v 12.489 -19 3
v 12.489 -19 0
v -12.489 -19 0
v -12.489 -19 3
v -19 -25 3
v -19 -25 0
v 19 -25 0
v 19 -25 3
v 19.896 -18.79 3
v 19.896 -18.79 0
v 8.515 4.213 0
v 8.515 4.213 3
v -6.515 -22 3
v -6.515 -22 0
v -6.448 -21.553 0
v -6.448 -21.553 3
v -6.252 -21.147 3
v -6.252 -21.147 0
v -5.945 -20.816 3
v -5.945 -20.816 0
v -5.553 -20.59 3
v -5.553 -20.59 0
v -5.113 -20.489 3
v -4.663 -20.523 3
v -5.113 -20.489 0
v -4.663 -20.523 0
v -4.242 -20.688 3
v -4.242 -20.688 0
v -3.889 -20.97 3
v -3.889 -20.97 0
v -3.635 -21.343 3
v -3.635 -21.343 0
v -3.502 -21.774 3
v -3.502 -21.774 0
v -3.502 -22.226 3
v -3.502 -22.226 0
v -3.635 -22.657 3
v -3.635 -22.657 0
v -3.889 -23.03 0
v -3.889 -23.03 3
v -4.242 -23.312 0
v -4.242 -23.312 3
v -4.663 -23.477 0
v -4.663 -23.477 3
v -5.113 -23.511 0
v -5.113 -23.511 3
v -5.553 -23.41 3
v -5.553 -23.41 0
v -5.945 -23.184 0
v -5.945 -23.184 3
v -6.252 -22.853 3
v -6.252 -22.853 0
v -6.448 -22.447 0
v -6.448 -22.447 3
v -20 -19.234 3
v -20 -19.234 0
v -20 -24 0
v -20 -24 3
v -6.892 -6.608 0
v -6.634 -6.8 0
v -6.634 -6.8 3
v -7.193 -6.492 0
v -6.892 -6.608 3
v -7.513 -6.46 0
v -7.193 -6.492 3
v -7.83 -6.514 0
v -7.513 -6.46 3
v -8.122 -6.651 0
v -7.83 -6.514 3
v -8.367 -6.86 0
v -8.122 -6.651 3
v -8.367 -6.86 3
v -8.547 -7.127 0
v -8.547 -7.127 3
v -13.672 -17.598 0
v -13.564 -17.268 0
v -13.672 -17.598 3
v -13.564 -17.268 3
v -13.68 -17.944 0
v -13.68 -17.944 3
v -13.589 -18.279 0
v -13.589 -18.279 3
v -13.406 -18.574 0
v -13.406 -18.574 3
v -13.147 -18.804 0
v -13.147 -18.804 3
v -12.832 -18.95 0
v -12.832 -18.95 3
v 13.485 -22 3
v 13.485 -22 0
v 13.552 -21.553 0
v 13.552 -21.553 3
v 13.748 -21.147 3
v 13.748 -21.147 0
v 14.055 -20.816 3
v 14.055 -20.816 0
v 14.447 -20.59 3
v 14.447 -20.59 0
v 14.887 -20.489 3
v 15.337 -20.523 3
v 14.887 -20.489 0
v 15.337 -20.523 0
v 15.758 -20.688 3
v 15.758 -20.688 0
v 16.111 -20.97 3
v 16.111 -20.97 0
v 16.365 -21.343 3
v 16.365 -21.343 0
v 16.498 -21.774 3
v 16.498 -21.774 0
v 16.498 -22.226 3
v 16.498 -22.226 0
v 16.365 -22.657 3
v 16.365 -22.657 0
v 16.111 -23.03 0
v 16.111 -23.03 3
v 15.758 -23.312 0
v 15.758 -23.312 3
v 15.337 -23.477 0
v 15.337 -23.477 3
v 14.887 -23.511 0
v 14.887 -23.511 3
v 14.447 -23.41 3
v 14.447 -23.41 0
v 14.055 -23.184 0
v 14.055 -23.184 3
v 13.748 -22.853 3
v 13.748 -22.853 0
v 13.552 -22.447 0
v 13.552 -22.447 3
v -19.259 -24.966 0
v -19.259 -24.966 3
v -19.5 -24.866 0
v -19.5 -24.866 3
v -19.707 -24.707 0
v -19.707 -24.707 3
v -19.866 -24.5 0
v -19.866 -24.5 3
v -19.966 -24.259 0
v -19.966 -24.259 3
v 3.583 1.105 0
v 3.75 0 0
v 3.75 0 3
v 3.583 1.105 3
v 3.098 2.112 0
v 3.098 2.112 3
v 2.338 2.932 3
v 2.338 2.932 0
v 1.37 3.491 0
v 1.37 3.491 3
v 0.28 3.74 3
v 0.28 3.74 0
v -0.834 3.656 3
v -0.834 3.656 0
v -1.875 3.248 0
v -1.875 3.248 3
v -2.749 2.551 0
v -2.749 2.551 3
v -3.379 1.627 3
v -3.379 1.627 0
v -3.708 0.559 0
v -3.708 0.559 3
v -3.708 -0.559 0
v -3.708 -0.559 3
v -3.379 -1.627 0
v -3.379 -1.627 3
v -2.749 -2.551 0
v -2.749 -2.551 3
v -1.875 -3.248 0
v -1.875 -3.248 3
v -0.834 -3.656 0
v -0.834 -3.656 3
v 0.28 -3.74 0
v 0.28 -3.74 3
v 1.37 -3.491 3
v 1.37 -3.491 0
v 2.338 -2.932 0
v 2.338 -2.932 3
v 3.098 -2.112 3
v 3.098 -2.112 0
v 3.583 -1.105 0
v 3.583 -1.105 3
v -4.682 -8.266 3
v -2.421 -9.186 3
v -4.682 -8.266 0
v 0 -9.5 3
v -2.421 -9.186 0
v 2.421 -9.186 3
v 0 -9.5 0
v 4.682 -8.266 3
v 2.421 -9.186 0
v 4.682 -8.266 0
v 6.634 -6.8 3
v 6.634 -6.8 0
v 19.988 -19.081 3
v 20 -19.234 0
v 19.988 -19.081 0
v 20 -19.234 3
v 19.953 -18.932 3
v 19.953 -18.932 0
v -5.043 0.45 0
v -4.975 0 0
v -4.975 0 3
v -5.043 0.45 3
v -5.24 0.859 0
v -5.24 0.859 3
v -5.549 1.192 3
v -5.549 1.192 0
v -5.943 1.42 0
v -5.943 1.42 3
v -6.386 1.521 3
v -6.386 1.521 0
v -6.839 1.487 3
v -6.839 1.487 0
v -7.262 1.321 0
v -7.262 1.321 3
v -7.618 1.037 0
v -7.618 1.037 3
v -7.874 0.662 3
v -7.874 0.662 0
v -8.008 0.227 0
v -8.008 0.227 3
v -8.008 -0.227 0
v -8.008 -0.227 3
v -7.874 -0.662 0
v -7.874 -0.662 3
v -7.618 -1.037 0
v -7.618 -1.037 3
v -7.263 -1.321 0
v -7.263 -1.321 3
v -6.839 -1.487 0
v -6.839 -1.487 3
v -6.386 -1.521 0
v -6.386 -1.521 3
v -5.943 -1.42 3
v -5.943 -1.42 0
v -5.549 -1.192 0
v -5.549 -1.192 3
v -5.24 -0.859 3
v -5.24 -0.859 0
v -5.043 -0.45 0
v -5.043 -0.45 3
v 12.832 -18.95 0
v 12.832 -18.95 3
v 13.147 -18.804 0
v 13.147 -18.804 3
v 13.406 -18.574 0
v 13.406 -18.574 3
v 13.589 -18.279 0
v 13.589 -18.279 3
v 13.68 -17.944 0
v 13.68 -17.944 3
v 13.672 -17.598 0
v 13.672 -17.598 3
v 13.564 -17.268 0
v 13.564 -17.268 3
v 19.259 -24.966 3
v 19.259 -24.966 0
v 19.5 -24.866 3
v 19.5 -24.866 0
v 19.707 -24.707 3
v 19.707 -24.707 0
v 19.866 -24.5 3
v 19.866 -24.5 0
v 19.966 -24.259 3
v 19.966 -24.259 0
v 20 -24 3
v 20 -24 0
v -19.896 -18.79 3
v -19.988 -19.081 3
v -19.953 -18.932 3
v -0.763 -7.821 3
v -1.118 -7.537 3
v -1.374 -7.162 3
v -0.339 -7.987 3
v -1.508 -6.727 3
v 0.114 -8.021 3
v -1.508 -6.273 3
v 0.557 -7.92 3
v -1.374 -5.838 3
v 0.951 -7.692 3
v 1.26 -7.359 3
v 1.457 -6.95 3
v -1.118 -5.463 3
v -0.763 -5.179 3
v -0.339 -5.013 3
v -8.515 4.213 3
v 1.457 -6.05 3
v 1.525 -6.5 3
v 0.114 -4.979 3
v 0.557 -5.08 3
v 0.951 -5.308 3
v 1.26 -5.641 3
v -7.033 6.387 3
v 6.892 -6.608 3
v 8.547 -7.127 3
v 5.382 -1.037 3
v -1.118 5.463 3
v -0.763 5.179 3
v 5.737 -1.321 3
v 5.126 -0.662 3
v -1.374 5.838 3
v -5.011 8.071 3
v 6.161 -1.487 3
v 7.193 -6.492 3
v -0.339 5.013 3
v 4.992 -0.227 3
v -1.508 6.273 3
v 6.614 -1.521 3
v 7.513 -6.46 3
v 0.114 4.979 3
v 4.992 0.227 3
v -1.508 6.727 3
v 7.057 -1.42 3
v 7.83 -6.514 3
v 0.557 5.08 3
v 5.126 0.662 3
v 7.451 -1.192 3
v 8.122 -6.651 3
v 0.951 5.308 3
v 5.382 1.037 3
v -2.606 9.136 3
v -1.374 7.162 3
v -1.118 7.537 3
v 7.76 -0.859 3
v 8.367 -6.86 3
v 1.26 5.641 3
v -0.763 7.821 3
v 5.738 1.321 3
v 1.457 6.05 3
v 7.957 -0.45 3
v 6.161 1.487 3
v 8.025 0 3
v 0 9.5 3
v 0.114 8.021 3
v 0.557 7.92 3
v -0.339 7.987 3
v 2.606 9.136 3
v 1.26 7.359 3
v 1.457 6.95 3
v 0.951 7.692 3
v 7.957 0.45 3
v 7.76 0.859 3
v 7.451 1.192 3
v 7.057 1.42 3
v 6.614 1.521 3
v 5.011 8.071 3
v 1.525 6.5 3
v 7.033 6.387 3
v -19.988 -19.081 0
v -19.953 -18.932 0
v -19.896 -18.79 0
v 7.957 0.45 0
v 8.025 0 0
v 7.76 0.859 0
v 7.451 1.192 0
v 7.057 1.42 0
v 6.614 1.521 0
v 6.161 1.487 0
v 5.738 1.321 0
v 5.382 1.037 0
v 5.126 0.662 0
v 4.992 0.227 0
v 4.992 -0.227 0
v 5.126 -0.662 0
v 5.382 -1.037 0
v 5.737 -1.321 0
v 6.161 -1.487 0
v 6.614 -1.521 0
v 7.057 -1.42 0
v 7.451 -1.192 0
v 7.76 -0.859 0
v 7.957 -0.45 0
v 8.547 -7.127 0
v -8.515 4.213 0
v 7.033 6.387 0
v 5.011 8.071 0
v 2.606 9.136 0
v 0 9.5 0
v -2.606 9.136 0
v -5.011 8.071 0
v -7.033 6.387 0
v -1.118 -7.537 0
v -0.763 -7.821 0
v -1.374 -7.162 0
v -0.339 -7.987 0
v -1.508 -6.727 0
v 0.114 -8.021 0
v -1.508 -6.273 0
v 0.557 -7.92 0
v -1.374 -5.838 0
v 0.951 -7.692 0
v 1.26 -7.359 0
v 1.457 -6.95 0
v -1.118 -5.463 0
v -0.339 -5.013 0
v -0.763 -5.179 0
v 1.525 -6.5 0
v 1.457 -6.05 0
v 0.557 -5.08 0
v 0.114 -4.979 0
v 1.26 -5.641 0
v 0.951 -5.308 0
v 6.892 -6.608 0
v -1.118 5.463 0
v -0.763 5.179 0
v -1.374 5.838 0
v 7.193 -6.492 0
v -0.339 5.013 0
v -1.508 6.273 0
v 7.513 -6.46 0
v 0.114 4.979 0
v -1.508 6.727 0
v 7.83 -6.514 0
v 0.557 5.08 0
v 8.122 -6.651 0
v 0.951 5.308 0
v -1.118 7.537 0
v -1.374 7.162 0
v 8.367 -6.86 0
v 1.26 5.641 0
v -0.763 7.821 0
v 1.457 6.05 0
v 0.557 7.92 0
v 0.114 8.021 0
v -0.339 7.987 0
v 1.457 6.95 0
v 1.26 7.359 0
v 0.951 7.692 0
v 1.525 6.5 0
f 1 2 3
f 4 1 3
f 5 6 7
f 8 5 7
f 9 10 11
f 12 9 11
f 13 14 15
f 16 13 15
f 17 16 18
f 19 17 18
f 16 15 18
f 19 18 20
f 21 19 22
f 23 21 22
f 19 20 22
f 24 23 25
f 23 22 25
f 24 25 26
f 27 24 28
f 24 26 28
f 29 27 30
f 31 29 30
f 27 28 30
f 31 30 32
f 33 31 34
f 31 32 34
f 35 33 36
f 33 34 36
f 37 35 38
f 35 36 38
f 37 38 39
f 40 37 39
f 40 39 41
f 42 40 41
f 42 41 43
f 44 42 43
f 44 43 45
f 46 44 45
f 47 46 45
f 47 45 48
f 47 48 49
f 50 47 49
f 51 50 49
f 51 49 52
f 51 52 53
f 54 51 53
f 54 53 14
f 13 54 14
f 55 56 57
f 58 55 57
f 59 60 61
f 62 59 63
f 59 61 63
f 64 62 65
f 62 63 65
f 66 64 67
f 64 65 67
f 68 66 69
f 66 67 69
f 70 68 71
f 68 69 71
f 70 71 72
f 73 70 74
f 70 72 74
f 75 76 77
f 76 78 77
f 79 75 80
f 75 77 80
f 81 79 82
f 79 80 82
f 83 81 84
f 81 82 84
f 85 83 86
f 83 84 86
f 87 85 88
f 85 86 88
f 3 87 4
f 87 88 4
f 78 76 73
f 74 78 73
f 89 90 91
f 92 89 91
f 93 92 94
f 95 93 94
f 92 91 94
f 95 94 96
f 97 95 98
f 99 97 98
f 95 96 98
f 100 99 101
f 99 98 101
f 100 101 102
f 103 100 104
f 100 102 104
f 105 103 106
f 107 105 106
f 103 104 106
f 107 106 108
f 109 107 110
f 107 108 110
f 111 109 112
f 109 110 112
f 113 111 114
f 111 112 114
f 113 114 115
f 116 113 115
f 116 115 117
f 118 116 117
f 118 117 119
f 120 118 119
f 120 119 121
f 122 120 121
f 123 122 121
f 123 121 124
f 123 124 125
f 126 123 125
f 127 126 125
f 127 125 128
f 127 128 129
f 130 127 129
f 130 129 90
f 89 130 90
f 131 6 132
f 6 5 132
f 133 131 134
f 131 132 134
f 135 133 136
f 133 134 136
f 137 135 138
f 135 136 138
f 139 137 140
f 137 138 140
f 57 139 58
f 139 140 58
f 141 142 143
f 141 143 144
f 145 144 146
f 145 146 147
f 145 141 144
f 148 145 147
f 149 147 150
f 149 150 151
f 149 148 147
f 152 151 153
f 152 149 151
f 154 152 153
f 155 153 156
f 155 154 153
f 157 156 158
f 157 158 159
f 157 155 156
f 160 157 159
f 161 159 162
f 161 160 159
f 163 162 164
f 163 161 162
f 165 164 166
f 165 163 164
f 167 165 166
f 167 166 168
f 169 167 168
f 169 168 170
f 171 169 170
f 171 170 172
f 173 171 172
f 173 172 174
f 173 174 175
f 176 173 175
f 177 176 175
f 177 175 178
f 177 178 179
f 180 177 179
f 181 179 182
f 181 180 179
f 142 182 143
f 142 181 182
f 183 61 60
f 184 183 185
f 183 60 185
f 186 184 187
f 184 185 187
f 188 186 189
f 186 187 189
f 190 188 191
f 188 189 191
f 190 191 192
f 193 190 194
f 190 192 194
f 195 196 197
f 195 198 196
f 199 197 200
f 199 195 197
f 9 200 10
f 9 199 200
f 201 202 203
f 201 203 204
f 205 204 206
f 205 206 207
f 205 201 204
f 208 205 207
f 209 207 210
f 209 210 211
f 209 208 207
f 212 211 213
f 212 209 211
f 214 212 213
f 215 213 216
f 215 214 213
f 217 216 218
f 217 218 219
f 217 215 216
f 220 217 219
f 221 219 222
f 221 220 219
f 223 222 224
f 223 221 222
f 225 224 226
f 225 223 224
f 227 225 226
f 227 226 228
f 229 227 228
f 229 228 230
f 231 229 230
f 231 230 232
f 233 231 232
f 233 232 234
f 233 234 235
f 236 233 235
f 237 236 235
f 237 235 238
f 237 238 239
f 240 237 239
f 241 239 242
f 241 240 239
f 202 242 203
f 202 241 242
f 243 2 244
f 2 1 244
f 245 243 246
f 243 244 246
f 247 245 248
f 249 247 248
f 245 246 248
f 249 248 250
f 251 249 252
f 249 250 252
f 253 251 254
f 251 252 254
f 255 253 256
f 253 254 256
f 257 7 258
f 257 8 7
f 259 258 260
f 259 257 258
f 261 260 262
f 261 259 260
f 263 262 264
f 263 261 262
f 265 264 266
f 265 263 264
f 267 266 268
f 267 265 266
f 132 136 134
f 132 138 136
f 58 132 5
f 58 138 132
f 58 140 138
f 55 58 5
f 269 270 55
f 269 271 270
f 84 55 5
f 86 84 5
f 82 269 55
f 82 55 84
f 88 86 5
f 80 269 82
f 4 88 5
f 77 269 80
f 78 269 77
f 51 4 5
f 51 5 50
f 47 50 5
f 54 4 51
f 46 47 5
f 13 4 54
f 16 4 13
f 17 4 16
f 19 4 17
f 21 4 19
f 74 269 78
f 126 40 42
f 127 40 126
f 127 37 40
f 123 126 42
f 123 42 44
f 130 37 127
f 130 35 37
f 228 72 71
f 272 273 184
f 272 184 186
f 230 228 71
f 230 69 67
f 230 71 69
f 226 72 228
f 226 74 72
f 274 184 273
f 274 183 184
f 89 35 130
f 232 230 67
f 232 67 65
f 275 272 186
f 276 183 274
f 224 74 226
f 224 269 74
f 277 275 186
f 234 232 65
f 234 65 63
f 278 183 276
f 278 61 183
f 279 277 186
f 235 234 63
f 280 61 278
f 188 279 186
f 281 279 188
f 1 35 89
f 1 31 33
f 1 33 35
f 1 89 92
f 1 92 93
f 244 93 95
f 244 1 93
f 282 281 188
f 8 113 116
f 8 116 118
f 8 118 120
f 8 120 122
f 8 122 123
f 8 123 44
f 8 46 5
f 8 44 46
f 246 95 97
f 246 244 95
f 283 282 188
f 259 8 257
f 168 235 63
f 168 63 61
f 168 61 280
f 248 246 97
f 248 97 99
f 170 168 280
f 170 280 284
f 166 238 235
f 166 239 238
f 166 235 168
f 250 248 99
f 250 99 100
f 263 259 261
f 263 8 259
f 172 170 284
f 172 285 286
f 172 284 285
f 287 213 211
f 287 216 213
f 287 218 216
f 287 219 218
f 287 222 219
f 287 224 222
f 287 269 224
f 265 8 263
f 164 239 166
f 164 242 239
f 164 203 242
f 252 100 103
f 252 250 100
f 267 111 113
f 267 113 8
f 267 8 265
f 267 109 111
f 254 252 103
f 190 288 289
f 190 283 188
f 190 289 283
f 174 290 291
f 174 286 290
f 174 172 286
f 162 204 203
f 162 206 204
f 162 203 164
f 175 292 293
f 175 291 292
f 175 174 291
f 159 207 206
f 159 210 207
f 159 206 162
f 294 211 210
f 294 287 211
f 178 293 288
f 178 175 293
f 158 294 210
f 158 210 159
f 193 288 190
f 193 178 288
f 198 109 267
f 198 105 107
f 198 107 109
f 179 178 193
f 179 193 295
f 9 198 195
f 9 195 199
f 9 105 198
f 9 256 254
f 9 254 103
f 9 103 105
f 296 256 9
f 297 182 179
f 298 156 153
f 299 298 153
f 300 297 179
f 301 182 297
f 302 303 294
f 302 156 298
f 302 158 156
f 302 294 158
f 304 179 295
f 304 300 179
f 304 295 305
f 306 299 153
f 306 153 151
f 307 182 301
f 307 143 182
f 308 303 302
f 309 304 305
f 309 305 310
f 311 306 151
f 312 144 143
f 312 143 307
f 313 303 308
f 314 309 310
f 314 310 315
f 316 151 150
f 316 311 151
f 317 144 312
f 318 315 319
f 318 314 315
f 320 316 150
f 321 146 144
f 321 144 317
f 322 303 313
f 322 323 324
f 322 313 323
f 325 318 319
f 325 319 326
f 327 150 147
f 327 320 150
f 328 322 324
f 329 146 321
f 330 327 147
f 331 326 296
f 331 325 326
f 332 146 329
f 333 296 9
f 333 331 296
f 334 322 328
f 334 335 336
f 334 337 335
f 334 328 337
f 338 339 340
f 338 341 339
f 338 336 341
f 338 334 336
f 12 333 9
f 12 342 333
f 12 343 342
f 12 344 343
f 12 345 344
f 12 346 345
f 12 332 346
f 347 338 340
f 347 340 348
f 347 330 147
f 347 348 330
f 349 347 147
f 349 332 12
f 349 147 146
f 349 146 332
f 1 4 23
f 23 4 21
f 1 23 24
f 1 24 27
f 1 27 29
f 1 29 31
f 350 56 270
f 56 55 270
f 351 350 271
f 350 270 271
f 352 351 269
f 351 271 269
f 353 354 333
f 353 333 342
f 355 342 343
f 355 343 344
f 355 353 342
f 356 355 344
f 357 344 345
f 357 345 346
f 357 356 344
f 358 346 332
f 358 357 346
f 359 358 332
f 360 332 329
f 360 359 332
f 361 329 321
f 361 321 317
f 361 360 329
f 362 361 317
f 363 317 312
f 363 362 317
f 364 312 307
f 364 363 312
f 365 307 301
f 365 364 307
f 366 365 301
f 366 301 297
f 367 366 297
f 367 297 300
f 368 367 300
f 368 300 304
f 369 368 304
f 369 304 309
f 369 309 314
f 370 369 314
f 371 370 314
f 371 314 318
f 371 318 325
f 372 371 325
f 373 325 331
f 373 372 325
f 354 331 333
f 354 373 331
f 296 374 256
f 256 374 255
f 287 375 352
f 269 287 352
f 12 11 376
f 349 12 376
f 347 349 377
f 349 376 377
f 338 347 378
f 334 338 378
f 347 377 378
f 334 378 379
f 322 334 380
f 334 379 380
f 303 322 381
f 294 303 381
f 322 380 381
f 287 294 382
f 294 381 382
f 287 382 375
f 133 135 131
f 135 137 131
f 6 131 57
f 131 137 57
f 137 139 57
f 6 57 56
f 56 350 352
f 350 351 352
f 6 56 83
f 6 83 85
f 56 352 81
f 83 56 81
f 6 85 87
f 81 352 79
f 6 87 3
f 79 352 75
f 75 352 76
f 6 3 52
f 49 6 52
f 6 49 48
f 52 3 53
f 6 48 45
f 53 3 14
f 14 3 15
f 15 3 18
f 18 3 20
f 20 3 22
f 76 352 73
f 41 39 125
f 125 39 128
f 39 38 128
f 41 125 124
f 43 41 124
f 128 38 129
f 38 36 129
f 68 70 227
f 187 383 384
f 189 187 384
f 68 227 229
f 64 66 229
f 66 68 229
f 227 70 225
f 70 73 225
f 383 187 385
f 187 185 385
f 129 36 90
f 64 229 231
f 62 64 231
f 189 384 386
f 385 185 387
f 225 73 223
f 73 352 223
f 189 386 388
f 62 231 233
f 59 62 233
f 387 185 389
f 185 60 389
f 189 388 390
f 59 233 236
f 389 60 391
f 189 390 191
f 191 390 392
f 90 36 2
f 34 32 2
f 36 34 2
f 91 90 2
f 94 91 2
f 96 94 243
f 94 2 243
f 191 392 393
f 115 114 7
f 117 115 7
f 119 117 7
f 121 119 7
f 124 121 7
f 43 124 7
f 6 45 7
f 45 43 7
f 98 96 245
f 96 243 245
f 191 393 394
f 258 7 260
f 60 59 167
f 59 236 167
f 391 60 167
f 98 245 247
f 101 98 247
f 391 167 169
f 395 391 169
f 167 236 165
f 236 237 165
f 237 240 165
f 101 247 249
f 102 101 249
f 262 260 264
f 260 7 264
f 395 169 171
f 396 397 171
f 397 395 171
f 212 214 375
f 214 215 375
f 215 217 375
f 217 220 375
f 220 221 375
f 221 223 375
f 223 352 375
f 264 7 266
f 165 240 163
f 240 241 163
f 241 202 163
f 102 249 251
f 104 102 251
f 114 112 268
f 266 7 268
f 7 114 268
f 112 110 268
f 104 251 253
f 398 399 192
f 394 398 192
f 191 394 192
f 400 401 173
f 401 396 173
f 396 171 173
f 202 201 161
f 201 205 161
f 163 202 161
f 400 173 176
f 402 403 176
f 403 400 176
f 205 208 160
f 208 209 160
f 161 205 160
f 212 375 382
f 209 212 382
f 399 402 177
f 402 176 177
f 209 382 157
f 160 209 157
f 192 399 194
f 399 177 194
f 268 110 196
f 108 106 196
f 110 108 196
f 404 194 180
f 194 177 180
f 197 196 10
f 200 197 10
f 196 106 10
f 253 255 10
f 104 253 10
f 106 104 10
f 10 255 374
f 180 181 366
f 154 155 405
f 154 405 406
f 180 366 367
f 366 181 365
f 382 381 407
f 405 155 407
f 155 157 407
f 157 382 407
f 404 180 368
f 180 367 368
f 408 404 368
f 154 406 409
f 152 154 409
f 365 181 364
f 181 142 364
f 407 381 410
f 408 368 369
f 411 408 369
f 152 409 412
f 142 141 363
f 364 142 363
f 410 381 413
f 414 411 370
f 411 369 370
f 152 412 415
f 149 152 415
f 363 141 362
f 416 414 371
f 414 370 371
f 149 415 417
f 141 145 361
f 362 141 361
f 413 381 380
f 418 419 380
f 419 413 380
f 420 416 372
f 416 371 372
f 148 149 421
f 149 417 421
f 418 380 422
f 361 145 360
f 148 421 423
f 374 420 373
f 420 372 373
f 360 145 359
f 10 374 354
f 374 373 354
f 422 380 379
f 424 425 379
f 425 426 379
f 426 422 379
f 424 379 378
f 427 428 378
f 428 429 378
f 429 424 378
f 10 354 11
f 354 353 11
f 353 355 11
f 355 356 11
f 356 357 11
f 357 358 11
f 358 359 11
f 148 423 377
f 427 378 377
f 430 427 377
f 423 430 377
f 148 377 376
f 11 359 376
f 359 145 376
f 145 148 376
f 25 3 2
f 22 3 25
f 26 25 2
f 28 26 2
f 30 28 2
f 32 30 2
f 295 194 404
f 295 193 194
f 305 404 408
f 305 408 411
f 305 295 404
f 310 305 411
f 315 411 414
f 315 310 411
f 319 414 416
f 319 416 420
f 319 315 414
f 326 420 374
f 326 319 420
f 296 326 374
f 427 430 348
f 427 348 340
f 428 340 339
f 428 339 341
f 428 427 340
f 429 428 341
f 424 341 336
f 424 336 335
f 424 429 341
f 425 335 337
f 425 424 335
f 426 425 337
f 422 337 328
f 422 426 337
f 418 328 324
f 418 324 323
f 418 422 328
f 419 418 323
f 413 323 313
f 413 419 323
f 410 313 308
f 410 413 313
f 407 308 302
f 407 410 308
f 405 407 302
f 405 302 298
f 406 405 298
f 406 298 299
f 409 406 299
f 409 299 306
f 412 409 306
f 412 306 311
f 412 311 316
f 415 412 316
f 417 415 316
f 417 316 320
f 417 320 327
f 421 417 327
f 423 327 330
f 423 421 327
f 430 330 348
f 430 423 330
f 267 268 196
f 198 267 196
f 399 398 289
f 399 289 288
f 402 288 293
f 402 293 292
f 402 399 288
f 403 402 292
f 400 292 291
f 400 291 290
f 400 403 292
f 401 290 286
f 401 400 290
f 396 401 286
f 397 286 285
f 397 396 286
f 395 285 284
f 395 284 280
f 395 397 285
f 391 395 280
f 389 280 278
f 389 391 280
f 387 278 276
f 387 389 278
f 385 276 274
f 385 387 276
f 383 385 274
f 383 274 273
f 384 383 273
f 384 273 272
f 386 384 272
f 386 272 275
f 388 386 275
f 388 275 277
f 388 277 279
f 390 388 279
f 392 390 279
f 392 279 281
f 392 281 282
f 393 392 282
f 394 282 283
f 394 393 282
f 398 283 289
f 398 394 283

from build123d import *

# Parameters (mm, degrees)
SKETCH_1_R          = 1.525
SKETCH_1_R_2        = 3.75
EXTRUDE_1_DEPTH     = 3
FILLET_1_R          = 1
SKETCH_2_R          = 1.515
CUT_EXTRUDE_1_DEPTH = 10
CUT_EXTRUDE_2_DEPTH = 10
FILLET_2_R          = 1.2


with BuildPart() as part:
    # 草图1 → 凸台-拉伸1 (new body)
    with BuildSketch(Plane.XY):
        with BuildLine():
            Line((-20, -25), (20, -25))
            Line((20, -25), (20, -19))
            Line((20, -19), (8.514771251, 4.212917106))
            ThreePointArc((8.514771251, 4.212917106), (0, 9.5), (-8.514771251, 4.212917106))
            Line((-8.514771251, 4.212917106), (-20, -19))
            Line((-20, -19), (-20, -25))
        make_face()
        with Locations((0, 6.5)):
            Circle(SKETCH_1_R, mode=Mode.SUBTRACT)
        with Locations((6.5, 0)):
            Circle(SKETCH_1_R, mode=Mode.SUBTRACT)
        with Locations((0, -6.5)):
            Circle(SKETCH_1_R, mode=Mode.SUBTRACT)
        with Locations((-6.5, 0)):
            Circle(SKETCH_1_R, mode=Mode.SUBTRACT)
        Circle(SKETCH_1_R_2, mode=Mode.SUBTRACT)
    extrude(amount=EXTRUDE_1_DEPTH)

    # 圆角1
    fillet_1_edges = [part.edges().sort_by_distance(p)[0] for p in [
        (20, -25, 1.5),
        (-20, -25, 1.5),
        (-20, -19, 1.5),
        (20, -19, 1.5),
    ]]
    fillet(fillet_1_edges, radius=FILLET_1_R)

    # 草图2 → 切除-拉伸1 (cut)
    with BuildSketch(Plane(origin=(0, 0, 0), x_dir=(-1, 0, 0), z_dir=(0, 0, -1))):
        with Locations((-15, -22)):
            Circle(SKETCH_2_R)
        with Locations((5, -22)):
            Circle(SKETCH_2_R)
    extrude(amount=-CUT_EXTRUDE_1_DEPTH, mode=Mode.SUBTRACT)

    # 草图3 → 切除-拉伸2 (cut)
    with BuildSketch(Plane(origin=(0, 0, 0), x_dir=(-1, 0, 0), z_dir=(0, 0, -1))):
        with BuildLine():
            Line((-7.743606738, -5.50332215), (-14.421459062, -19))
            Line((-14.421459062, -19), (14.421459062, -19))
            Line((14.421459062, -19), (7.743606738, -5.50332215))
            ThreePointArc((7.743606738, -5.50332215), (0, -9.5), (-7.743606738, -5.50332215))
        make_face()
    extrude(amount=-CUT_EXTRUDE_2_DEPTH, mode=Mode.SUBTRACT)

    # 圆角2
    fillet_2_edges = [part.edges().sort_by_distance(p)[0] for p in [
        (7.743606738, -5.50332215, 1.5),
        (-7.743606738, -5.50332215, 1.5),
        (-14.421459062, -19, 1.5),
        (14.421459062, -19, 1.5),
    ]]
    fillet(fillet_2_edges, radius=FILLET_2_R)


solid = part.part
